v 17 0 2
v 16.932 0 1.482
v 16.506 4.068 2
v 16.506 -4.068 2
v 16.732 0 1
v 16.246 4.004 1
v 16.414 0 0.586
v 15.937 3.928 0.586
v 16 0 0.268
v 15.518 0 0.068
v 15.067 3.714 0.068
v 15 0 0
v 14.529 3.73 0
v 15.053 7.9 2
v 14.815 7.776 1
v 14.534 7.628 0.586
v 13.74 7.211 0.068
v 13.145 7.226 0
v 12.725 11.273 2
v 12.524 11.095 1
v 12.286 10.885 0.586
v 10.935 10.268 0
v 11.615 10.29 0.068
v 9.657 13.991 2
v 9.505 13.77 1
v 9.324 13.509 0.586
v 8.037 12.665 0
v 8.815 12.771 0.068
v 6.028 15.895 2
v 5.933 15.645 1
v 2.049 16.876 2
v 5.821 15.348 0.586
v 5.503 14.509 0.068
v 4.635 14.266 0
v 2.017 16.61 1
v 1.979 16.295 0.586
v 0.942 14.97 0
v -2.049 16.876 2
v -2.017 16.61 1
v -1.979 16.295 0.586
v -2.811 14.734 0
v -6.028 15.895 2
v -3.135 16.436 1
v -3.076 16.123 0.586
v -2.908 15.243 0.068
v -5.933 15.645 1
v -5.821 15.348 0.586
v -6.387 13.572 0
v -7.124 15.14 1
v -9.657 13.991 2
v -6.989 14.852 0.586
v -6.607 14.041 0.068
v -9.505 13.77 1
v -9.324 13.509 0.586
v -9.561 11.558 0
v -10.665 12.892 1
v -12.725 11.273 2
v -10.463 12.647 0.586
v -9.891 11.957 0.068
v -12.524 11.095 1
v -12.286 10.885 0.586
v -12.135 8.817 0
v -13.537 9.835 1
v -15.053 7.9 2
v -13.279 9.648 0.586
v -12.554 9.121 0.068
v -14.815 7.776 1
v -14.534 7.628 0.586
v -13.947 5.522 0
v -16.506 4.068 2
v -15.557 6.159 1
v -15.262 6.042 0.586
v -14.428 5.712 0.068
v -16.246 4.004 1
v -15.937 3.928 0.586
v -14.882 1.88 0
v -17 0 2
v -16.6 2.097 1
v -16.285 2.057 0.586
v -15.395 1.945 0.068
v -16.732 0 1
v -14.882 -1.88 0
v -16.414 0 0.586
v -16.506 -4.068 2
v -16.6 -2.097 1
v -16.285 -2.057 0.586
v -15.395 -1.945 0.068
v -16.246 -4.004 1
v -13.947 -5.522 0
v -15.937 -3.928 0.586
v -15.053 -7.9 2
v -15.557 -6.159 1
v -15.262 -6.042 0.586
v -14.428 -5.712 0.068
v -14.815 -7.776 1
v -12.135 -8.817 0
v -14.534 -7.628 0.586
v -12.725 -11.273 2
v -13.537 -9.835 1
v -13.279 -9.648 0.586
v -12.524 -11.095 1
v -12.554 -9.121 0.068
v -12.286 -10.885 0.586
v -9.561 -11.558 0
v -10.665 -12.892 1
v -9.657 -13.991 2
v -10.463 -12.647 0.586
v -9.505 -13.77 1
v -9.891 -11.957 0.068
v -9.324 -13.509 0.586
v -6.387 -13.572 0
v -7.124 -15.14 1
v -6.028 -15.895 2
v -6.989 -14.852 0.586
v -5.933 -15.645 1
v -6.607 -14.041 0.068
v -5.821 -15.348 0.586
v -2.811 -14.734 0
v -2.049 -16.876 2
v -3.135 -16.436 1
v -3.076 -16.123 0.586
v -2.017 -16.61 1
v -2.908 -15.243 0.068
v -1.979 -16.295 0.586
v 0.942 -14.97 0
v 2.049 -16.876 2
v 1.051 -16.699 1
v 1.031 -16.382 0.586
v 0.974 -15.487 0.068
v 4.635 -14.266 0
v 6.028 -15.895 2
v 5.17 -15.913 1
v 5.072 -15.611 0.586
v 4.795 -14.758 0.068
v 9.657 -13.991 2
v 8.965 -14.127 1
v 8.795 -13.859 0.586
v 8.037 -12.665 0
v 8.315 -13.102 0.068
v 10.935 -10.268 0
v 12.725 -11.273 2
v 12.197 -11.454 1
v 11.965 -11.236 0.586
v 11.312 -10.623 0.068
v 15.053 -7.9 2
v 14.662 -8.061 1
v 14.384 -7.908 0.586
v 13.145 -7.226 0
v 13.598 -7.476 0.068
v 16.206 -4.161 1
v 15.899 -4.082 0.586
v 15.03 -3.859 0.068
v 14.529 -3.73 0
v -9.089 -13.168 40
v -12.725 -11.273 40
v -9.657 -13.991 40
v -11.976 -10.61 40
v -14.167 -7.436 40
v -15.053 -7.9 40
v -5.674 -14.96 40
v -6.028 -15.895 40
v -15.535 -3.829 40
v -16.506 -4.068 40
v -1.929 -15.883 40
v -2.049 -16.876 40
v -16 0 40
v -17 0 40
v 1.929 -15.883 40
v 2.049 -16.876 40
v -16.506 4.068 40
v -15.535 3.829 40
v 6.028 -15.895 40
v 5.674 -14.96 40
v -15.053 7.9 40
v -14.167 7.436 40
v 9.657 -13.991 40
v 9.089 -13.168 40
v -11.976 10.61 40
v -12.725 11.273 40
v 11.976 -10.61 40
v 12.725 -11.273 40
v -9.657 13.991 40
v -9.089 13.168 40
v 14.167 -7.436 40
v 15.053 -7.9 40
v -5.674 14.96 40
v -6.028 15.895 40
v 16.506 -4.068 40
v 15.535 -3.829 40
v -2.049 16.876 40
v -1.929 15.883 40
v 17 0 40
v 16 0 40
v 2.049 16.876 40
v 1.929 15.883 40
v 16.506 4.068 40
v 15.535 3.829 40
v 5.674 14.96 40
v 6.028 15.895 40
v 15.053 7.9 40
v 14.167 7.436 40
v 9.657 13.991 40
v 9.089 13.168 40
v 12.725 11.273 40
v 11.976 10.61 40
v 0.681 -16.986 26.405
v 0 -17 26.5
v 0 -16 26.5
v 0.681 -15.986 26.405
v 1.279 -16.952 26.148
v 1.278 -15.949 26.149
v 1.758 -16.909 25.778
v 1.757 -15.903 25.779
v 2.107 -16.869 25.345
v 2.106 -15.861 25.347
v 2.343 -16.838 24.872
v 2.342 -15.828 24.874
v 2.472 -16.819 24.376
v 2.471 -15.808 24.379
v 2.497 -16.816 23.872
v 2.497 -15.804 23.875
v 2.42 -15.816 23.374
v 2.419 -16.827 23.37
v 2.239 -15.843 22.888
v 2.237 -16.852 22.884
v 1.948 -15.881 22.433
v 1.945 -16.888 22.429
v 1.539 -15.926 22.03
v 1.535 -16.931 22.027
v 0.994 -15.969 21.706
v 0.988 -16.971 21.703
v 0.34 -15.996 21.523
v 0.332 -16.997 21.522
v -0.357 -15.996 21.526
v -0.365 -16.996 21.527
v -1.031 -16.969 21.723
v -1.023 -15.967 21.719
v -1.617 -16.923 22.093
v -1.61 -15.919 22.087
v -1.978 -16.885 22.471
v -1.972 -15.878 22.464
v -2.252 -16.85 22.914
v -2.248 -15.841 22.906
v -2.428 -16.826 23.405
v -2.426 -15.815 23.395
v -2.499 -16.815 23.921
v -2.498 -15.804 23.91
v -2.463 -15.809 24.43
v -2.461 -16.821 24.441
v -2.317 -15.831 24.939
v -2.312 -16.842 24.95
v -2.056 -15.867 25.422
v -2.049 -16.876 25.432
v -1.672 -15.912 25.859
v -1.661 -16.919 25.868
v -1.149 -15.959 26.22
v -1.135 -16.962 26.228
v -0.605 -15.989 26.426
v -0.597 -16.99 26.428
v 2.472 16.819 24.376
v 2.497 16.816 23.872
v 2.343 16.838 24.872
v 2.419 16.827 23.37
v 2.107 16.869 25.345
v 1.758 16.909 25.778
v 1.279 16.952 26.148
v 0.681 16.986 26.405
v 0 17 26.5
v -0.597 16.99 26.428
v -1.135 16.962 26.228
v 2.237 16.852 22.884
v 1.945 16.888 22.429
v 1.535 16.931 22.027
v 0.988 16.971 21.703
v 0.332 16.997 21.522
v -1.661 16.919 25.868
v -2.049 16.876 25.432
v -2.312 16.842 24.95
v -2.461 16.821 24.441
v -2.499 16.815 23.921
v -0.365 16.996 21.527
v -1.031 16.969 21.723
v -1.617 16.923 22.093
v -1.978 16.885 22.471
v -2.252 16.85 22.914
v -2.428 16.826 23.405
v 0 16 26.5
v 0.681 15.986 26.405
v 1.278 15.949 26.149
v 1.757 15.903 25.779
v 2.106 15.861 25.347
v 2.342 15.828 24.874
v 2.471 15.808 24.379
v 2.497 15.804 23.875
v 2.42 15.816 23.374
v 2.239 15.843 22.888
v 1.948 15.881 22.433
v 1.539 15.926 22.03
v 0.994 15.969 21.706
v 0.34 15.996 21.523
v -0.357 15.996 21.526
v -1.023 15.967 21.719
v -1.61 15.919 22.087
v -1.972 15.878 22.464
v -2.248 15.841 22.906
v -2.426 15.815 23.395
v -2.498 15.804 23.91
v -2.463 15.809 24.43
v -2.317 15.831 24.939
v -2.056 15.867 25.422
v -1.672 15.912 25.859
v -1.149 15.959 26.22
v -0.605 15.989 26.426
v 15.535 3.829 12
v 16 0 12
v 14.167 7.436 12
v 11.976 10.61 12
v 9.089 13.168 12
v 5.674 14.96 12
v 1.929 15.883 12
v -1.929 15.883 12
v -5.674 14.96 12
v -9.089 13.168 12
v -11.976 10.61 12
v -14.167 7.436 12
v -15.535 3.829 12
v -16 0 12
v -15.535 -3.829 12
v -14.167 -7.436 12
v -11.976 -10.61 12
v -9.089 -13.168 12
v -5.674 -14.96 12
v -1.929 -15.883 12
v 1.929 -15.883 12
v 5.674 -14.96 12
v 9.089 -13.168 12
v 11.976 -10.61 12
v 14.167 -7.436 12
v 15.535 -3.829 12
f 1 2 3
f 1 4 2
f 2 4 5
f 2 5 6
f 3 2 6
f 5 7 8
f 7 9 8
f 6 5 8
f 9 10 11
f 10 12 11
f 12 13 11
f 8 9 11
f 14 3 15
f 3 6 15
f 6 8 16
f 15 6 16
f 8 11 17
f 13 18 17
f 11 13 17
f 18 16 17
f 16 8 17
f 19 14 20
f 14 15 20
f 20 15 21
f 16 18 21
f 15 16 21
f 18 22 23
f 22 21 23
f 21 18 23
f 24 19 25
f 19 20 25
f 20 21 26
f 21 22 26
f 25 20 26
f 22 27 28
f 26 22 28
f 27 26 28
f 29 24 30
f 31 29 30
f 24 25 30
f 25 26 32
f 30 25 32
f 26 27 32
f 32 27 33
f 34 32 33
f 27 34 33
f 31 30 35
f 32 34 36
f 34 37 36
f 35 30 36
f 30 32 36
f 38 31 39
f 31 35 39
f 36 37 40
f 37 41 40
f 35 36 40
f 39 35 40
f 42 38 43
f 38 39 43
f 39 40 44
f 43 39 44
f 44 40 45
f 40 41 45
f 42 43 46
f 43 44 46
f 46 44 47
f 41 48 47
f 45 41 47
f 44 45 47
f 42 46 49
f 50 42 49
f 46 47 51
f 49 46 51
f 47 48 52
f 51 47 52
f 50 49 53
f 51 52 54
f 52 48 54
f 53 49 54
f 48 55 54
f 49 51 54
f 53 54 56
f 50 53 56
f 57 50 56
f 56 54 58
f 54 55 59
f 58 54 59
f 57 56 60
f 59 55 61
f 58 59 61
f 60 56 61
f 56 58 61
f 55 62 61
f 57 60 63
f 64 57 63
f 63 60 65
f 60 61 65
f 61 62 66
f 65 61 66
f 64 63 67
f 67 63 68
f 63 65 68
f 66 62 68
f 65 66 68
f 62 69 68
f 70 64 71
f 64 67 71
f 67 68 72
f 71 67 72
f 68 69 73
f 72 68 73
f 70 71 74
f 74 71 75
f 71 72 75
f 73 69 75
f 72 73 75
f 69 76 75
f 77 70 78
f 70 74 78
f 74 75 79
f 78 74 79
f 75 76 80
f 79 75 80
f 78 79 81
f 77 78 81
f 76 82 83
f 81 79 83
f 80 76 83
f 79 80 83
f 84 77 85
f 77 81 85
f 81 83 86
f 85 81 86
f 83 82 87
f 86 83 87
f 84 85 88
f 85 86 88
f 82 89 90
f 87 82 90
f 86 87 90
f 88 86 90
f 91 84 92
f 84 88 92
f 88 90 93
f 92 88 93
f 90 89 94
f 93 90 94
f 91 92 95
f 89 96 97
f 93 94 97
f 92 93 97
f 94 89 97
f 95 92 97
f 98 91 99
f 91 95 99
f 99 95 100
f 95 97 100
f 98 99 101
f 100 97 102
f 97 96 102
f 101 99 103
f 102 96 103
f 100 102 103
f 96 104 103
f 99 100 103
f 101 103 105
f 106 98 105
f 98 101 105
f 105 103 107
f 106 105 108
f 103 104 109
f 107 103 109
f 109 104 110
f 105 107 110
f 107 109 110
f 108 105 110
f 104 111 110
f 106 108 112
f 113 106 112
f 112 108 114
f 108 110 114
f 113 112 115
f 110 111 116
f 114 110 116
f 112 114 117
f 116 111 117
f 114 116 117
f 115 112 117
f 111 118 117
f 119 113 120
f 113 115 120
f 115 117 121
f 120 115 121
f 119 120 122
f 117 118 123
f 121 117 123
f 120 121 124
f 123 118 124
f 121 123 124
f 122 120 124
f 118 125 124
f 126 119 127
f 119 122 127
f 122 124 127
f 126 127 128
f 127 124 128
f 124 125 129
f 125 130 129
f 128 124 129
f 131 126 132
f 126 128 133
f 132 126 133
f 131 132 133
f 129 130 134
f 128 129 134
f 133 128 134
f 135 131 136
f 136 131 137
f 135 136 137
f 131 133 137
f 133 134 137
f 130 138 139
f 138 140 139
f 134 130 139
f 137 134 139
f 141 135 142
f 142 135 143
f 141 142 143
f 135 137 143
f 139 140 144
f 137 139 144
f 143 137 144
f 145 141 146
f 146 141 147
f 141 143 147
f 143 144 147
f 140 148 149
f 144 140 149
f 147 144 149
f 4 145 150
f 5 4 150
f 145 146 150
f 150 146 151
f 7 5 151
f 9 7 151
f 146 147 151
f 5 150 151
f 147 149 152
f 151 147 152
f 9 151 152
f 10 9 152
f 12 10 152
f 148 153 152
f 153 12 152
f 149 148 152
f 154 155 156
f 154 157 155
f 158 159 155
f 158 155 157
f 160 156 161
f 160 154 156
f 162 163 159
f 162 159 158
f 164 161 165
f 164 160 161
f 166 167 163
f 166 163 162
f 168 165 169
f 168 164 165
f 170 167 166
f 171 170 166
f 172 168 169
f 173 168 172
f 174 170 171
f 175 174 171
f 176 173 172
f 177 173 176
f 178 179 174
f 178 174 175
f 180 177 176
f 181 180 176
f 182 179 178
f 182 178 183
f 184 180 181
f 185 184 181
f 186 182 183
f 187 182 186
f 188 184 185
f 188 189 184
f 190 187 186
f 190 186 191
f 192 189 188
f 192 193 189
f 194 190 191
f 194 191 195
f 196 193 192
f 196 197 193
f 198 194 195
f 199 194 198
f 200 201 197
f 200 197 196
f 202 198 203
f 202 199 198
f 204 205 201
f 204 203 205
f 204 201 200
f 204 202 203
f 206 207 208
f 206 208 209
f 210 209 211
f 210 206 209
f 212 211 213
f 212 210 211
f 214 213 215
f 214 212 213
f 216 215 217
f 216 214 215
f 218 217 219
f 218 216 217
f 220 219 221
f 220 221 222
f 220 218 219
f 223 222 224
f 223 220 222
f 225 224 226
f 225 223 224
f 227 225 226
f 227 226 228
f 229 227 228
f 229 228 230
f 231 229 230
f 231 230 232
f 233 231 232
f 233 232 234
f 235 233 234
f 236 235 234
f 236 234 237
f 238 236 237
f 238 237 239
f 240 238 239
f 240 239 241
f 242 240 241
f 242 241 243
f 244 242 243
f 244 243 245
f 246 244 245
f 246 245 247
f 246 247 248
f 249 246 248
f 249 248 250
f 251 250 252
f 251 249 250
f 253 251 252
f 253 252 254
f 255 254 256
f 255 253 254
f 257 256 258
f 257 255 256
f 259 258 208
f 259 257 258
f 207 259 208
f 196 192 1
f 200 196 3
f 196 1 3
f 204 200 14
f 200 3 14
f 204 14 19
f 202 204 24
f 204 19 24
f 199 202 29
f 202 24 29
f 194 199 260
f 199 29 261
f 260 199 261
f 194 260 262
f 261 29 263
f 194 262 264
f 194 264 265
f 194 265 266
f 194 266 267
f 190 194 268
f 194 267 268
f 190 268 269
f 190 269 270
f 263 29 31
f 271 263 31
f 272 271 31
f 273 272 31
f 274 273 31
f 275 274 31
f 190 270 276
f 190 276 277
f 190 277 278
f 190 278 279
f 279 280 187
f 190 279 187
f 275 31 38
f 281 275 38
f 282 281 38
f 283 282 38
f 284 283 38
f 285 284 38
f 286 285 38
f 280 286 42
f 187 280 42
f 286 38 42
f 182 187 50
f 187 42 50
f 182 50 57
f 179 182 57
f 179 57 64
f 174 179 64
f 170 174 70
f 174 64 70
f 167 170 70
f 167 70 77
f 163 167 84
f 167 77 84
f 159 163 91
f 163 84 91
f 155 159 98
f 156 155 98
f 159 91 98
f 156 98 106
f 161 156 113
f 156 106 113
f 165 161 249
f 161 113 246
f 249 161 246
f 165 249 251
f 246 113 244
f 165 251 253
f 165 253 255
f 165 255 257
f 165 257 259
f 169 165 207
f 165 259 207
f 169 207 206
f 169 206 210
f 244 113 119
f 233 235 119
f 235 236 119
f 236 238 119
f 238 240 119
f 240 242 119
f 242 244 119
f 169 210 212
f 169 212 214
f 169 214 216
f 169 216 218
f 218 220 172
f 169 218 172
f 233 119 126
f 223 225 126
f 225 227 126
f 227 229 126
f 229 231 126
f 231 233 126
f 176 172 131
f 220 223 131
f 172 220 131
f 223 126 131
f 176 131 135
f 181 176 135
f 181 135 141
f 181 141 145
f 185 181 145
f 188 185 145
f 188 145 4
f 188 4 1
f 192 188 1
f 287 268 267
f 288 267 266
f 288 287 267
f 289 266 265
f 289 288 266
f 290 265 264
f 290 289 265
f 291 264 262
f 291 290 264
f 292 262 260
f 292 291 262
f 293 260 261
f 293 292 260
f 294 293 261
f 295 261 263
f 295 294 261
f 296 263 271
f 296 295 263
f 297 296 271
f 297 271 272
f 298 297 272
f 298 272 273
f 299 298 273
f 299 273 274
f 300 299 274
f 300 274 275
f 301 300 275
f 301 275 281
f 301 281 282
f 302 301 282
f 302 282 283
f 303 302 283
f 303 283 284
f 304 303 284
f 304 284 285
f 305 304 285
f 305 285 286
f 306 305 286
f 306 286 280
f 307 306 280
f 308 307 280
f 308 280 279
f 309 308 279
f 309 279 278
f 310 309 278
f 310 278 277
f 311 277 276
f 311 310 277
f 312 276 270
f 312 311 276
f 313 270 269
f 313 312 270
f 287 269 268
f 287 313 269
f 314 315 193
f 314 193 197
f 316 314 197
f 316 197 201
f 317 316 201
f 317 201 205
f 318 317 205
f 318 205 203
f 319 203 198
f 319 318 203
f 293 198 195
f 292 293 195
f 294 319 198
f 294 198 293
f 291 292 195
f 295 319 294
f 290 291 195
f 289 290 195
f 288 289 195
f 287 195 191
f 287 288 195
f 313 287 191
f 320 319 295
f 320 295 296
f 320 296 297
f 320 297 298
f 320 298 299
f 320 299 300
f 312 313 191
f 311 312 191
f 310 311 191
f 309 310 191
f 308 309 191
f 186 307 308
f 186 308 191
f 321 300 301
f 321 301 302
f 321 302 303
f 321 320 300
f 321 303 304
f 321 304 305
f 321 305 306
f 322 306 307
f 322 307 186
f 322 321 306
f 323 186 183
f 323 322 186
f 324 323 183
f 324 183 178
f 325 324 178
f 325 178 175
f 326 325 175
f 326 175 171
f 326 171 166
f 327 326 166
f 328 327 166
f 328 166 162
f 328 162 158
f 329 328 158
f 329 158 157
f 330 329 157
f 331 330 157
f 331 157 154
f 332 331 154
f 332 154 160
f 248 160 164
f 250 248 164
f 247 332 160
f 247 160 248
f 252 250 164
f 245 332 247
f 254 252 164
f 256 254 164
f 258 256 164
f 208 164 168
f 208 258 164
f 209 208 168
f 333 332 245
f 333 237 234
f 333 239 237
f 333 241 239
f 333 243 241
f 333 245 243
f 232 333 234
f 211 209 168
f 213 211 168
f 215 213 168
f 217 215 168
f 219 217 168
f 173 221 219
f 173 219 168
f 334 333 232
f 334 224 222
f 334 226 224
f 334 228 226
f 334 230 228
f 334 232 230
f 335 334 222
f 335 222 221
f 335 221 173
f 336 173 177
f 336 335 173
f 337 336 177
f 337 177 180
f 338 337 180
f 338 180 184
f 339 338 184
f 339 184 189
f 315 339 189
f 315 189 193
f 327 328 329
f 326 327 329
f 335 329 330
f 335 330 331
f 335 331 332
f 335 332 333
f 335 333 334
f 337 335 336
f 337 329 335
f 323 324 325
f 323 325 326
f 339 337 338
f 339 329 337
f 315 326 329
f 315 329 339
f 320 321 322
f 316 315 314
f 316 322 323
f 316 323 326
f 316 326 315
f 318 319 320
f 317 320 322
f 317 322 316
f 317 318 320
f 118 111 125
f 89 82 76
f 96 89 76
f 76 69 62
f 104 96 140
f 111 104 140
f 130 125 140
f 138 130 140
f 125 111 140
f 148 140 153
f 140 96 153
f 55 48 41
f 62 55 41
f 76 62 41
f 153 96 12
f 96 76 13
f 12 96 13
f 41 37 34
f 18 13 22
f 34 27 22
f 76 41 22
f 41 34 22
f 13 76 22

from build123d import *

# Parameters (mm, degrees)
SKETCH1_R               = 17
BOSS_EXTRUDE1_DEPTH     = 12
SKETCH2_R               = 17
SKETCH2_R_2             = 16
BOSS_EXTRUDE2_DEPTH     = 28
CUT_EXTRUDE1_DEPTH      = 47.669047558
CUT_EXTRUDE1_DEPTH_BACK = 47.669047558
SKETCH3_R               = 2.5
FILLET1_R               = 2


with BuildPart() as part:
    # Sketch1 → Boss-Extrude1 (new body)
    with BuildSketch(Plane.XY):
        Circle(SKETCH1_R)
    extrude(amount=BOSS_EXTRUDE1_DEPTH)

    # Sketch2 → Boss-Extrude2 (add)
    with BuildSketch(Plane.XY.offset(12)):
        Circle(SKETCH2_R)
        Circle(SKETCH2_R_2, mode=Mode.SUBTRACT)
    extrude(amount=BOSS_EXTRUDE2_DEPTH)

    # Sketch3 → Cut-Extrude1 (cut, two sides: drawn at the far end of the back side and taken through both)
    with BuildSketch(Plane(origin=(0, 0, 0), x_dir=(1, 0, 0), z_dir=(0, 1, 0)).offset(-CUT_EXTRUDE1_DEPTH_BACK)):
        with Locations(Location((0, -24, 0), (0, 0, 270))):
            Circle(SKETCH3_R)
    extrude(amount=CUT_EXTRUDE1_DEPTH + CUT_EXTRUDE1_DEPTH_BACK, mode=Mode.SUBTRACT)

    # Fillet1
    fillet1_edges = [part.edges().sort_by_distance(p)[0] for p in [
        (-17, 0, 0),
    ]]
    fillet(fillet1_edges, radius=FILLET1_R)


solid = part.part
